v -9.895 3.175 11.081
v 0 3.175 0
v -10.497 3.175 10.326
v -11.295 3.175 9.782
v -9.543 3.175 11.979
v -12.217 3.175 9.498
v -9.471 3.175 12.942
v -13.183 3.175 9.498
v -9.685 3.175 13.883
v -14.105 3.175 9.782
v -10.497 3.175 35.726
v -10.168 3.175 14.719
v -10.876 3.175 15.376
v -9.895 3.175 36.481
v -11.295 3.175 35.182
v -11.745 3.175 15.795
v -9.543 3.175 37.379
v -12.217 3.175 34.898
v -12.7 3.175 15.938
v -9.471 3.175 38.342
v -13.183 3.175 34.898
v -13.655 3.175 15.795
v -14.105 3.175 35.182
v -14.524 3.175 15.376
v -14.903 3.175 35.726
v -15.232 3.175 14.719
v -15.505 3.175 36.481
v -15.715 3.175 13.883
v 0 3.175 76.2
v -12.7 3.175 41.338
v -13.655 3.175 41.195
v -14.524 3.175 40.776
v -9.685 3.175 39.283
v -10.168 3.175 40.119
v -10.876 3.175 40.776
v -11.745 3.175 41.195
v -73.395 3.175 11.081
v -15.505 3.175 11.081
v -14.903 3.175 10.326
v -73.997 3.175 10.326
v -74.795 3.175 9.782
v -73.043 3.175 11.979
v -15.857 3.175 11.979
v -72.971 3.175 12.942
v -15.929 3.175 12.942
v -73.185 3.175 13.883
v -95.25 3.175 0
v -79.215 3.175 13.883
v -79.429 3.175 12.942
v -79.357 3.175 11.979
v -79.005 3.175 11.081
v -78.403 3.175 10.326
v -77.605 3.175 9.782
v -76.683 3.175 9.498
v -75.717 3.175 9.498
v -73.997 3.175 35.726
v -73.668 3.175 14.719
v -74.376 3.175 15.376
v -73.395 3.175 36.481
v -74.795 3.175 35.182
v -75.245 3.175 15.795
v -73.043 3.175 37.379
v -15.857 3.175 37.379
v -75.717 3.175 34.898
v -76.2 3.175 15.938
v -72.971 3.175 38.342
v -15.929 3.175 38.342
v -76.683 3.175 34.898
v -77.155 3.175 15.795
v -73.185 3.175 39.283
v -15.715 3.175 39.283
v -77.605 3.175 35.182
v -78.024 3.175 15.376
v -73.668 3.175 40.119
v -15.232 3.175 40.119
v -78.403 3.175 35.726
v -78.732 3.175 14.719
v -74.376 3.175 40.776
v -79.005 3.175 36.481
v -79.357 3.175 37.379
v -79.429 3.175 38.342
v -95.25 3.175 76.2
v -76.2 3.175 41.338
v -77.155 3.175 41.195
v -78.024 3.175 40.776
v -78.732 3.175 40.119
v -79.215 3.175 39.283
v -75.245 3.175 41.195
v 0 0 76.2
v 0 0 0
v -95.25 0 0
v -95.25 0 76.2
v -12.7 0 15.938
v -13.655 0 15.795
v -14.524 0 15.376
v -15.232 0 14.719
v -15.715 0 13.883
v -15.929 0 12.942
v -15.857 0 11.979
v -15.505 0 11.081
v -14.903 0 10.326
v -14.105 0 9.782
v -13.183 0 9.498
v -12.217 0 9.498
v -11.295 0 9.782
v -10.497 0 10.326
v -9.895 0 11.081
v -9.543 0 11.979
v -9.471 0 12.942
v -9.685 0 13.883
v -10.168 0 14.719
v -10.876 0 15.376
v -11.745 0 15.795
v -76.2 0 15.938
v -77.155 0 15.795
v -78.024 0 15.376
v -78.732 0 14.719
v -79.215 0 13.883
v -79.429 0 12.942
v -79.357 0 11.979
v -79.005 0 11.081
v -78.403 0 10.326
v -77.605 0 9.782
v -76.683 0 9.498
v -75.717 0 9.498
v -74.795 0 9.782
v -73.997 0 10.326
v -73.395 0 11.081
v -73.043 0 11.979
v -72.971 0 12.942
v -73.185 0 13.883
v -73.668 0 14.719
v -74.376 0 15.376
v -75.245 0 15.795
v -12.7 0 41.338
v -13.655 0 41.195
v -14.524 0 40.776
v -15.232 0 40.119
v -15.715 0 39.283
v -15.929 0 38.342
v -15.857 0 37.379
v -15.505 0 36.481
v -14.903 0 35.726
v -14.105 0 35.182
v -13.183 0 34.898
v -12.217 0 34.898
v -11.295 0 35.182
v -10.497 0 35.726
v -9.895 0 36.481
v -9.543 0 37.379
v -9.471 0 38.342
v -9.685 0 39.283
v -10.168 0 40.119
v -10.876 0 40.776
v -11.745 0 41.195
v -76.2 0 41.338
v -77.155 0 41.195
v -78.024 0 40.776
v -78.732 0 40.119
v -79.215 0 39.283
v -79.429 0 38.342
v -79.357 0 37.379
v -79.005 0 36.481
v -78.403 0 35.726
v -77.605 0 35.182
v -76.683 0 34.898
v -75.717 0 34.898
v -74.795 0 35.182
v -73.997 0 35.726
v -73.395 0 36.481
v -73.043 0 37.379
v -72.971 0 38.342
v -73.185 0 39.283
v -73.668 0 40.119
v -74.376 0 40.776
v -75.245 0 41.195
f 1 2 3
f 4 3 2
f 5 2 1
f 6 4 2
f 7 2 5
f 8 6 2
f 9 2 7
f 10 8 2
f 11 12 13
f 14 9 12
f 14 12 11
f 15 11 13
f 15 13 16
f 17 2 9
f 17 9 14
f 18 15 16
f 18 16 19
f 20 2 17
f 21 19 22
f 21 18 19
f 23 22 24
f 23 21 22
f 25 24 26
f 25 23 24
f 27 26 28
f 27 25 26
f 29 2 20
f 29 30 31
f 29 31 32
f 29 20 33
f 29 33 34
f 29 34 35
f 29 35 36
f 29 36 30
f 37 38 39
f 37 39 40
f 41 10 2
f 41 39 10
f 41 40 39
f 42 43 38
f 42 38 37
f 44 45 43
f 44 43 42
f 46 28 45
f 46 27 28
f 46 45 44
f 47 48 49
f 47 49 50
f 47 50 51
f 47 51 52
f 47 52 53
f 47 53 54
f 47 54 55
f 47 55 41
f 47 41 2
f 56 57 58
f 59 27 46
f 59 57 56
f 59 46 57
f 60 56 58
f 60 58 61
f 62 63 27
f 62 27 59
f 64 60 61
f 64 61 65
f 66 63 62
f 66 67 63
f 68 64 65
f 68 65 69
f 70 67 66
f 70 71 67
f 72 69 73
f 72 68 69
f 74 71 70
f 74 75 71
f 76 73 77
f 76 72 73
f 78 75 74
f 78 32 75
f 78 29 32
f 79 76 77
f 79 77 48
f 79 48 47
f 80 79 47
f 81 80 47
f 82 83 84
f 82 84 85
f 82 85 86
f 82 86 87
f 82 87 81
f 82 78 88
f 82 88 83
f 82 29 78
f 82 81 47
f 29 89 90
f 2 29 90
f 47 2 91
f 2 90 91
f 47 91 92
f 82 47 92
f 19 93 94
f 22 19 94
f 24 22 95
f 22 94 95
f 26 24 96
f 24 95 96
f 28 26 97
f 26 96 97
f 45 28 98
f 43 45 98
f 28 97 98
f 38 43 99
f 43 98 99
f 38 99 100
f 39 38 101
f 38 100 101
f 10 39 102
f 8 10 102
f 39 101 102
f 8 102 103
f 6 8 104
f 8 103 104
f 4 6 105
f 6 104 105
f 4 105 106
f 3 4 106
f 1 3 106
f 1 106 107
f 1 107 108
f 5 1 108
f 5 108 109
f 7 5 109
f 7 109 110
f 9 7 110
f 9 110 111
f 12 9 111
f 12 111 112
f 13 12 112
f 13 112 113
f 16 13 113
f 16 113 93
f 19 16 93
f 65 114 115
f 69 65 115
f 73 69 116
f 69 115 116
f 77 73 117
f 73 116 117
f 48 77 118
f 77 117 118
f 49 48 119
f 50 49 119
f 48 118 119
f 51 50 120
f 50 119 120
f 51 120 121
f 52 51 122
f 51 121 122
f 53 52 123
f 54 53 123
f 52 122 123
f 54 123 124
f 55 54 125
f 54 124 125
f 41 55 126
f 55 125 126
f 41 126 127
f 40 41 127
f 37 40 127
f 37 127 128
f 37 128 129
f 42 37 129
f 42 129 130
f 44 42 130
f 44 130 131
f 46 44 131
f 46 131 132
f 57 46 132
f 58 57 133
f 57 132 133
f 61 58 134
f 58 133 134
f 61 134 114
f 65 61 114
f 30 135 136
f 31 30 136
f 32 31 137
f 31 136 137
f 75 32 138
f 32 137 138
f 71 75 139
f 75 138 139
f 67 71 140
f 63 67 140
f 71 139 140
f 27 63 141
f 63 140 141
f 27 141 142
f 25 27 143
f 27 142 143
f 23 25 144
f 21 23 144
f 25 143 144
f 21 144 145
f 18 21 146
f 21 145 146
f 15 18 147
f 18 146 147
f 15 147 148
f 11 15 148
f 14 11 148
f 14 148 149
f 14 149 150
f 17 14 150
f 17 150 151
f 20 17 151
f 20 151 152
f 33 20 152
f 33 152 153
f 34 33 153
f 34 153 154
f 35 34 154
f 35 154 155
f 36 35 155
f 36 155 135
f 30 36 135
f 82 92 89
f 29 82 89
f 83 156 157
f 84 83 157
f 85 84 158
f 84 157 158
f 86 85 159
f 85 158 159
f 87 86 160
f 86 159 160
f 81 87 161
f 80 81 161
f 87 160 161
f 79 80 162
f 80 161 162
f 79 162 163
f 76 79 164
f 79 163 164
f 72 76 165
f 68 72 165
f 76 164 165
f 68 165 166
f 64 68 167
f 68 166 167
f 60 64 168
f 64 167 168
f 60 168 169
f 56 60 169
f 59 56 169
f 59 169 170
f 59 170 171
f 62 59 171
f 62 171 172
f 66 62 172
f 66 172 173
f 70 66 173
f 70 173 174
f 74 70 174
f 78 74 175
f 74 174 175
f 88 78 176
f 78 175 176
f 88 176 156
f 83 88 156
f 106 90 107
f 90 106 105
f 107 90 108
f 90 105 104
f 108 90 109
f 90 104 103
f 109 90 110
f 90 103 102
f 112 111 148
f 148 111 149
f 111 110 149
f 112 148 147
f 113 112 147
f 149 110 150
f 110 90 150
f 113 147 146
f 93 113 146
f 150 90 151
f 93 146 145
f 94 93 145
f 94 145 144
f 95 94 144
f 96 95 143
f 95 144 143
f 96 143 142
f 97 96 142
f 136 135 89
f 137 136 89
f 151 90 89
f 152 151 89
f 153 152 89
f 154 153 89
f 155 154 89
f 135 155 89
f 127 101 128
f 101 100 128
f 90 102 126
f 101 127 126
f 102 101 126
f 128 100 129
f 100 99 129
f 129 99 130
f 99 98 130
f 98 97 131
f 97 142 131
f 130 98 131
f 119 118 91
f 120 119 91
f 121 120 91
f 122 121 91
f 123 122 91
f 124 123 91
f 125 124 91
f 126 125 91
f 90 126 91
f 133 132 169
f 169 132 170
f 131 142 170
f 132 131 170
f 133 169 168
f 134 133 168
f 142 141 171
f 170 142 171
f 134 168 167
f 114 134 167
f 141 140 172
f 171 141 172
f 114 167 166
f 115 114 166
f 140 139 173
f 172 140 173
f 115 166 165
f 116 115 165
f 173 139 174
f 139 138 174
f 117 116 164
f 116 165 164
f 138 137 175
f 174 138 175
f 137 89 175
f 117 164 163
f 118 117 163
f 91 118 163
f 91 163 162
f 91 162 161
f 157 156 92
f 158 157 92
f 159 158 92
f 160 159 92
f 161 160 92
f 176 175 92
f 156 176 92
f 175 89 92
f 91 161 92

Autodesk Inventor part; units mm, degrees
ref_plane "YZ Plane" through (0, 0, 0) normal (1, 0, 0) x (0, 1, 0)
ref_plane "XZ Plane" through (0, 0, 0) normal (0, 1, 0) x (-1, 0, 0)
ref_plane "XY Plane" through (0, 0, 0) normal (0, 0, 1) x (1, 0, 0)
sketch "Sketch1" plane through (0, 0, 0) normal (0, 1, 0) x (-1, 0, 0)
  line L0 (0, 0) -> (95.25, 0)
  line L1 (95.25, 0) -> (95.25, 76.2)
  line L2 (95.25, 76.2) -> (0, 76.2)
  line L3 (0, 76.2) -> (0, 0)
  point P0 (76.2, 12.7)
  point P1 (12.7, 13.1017)
  point P2 (76.2, 38.1)
  point P3 (12.7, 38.1)
  dimension "d0" = 95.25
  dimension "d1" = 76.2
  dimension "d14" = 12.7
  dimension "d15" = 19.05
  dimension "d16" = 63.5
  dimension "d29" = 19.05
  dimension "d30" = 38.1
  dimension "d31" = 63.5
extrude "Extrusion2" add sketch "Sketch1" along normal blind 3.175
sketch "Sketch3" plane through (0, 3.175, 0) normal (0, 1, 0) x (1, 0, 0)
  line L0 (0, 0) -> (-95.25, 0) projected
  line L1 (-95.25, 0) -> (-95.25, -76.2) projected
  point P0 (-76.2, -12.7)
  point P1 (-12.7, -12.7)
  point P2 (-76.2, -38.1)
  point P3 (-12.7, -38.1)
  dimension "d19" = 19.05
  dimension "d20" = 12.7
  dimension "d21" = 63.5
  dimension "d32" = 25.4
  dimension "d33" = 63.5
  dimension "d34" = 19.05
hole "Hole3" at (-76.2, 3.175, 12.7) at (-12.7, 3.175, 12.7) at (-76.2, 3.175, 38.1) at (-12.7, 3.175, 38.1) direction (0, -1, 0) diameter 6.477 end through all
properties part number "slider"
